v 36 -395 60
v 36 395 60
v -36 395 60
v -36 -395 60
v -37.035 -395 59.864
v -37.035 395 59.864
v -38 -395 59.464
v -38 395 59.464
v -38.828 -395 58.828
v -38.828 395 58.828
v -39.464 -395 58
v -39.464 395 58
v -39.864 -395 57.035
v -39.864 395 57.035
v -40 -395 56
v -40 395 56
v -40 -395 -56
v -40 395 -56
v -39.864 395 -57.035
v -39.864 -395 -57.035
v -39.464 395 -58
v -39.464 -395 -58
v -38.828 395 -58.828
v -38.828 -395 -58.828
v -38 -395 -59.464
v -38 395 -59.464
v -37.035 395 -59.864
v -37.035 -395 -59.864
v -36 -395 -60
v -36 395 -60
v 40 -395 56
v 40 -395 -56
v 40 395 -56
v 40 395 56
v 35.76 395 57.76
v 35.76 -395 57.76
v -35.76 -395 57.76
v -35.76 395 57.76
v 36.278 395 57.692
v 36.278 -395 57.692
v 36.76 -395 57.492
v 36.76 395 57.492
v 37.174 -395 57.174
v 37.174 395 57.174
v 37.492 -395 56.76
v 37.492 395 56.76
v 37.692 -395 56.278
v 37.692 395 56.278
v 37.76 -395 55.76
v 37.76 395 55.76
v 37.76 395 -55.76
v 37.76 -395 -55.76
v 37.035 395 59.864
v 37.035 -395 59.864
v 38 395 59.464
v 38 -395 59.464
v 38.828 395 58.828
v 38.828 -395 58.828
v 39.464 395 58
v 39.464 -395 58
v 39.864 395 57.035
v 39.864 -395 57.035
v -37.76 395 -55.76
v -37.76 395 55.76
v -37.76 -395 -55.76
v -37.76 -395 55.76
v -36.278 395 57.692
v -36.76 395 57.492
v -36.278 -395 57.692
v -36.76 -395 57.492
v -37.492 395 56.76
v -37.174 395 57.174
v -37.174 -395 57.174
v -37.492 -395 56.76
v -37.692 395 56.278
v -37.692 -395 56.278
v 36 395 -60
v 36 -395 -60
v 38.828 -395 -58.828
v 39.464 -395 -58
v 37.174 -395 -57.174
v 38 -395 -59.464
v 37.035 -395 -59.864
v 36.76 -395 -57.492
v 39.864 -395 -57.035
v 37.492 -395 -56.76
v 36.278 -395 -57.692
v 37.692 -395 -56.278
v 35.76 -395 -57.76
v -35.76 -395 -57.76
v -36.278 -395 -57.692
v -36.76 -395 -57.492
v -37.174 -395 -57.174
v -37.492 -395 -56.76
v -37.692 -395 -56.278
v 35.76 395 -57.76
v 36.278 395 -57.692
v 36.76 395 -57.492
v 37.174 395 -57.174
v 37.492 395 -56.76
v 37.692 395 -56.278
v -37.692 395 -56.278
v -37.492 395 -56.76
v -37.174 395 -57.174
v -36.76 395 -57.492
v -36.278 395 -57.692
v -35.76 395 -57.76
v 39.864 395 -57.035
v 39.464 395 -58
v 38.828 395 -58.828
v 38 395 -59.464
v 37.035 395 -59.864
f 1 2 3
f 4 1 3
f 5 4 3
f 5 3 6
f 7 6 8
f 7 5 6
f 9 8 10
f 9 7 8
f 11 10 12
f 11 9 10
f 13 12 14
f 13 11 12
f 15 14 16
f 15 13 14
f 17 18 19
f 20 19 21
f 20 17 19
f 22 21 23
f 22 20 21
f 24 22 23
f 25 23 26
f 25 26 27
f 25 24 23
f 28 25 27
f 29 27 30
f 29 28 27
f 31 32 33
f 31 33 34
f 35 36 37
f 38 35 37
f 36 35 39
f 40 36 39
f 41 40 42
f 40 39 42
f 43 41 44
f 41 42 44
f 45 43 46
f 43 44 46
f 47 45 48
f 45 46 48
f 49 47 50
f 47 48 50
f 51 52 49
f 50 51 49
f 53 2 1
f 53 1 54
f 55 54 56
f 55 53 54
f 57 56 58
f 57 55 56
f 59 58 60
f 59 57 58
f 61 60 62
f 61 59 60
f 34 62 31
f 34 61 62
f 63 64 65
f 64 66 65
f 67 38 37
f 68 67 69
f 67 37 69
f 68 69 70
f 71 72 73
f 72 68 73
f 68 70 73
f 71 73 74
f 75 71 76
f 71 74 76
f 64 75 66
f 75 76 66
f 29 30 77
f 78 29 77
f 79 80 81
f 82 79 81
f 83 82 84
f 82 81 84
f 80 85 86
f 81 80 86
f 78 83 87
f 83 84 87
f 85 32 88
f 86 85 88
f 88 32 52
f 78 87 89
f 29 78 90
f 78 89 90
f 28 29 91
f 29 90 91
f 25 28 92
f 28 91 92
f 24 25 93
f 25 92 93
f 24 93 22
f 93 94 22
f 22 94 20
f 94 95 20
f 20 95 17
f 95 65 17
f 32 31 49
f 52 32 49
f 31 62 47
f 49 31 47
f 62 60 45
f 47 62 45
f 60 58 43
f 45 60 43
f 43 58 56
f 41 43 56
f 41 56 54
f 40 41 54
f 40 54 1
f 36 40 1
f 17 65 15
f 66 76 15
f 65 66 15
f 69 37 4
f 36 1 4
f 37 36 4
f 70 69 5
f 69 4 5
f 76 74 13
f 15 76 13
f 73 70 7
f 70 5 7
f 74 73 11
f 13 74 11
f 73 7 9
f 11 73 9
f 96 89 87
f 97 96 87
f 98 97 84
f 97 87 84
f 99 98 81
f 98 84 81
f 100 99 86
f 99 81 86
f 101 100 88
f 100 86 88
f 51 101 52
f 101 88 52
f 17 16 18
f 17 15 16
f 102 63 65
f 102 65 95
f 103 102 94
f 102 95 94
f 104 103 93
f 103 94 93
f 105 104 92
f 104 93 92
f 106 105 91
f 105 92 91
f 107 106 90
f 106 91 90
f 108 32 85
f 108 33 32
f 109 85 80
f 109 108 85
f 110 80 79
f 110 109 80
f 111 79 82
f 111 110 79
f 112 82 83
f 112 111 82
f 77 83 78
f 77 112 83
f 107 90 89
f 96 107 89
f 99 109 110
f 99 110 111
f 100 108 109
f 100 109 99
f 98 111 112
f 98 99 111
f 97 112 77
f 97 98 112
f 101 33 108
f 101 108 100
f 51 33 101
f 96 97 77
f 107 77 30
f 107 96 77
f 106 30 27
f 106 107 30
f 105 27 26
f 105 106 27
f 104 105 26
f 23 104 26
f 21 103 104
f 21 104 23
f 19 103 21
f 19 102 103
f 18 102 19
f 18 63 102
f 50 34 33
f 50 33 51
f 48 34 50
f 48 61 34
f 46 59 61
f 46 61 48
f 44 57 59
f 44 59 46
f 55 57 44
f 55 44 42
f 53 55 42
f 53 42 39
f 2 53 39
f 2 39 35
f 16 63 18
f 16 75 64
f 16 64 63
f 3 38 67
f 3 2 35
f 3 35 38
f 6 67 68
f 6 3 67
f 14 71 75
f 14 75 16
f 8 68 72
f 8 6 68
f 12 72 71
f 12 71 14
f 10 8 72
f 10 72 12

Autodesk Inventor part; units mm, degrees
ref_plane "YZ Plane" through (0, 0, 0) normal (1, 0, 0) x (0, 1, 0)
ref_plane "XZ Plane" through (0, 0, 0) normal (0, 1, 0) x (-1, 0, 0)
ref_plane "XY Plane" through (0, 0, 0) normal (0, 0, 1) x (1, 0, 0)
sketch "Sketch2" plane through (0, 0, 0) normal (0, 1, 0) x (-1, 0, 0)
  line L0 (-40, 60) -> (40, 60)
  line L1 (40, 60) -> (40, -60)
  line L2 (40, -60) -> (-40, -60)
  line L3 (-40, -60) -> (-40, 60)
  line L4 (-40, 60) -> (40, -60) construction
  line L5 (40, 60) -> (-40, -60) construction
  line L6 (-37.76, 57.76) -> (37.76, 57.76)
  line L7 (37.76, 57.76) -> (37.76, -57.76)
  line L8 (37.76, -57.76) -> (-37.76, -57.76)
  line L9 (-37.76, -57.76) -> (-37.76, 57.76)
  line L10 (-37.76, 57.76) -> (37.76, -57.76) construction
  line L11 (37.76, 57.76) -> (-37.76, -57.76) construction
  point P0 (0, 0)
  dimension "d8" = 80
  dimension "d9" = 120
  dimension "d10" = 75.52
  dimension "d61" = 115.52
extrude "Extrusion2" add sketch "Sketch2" along normal mid plane 790
fillet "Fillet2" radius 4 4 edges at (-40, 0, 60) (40, 0, 60) (40, 0, -60) (-40, 0, -60)
fillet "Fillet2" radius 2 4 edges at (37.76, 0, 57.76) (-37.76, 0, -57.76) (37.76, 0, -57.76) (-37.76, 0, 57.76)
properties part number "tubo3-40x80x800" material "Acero, carbono"
